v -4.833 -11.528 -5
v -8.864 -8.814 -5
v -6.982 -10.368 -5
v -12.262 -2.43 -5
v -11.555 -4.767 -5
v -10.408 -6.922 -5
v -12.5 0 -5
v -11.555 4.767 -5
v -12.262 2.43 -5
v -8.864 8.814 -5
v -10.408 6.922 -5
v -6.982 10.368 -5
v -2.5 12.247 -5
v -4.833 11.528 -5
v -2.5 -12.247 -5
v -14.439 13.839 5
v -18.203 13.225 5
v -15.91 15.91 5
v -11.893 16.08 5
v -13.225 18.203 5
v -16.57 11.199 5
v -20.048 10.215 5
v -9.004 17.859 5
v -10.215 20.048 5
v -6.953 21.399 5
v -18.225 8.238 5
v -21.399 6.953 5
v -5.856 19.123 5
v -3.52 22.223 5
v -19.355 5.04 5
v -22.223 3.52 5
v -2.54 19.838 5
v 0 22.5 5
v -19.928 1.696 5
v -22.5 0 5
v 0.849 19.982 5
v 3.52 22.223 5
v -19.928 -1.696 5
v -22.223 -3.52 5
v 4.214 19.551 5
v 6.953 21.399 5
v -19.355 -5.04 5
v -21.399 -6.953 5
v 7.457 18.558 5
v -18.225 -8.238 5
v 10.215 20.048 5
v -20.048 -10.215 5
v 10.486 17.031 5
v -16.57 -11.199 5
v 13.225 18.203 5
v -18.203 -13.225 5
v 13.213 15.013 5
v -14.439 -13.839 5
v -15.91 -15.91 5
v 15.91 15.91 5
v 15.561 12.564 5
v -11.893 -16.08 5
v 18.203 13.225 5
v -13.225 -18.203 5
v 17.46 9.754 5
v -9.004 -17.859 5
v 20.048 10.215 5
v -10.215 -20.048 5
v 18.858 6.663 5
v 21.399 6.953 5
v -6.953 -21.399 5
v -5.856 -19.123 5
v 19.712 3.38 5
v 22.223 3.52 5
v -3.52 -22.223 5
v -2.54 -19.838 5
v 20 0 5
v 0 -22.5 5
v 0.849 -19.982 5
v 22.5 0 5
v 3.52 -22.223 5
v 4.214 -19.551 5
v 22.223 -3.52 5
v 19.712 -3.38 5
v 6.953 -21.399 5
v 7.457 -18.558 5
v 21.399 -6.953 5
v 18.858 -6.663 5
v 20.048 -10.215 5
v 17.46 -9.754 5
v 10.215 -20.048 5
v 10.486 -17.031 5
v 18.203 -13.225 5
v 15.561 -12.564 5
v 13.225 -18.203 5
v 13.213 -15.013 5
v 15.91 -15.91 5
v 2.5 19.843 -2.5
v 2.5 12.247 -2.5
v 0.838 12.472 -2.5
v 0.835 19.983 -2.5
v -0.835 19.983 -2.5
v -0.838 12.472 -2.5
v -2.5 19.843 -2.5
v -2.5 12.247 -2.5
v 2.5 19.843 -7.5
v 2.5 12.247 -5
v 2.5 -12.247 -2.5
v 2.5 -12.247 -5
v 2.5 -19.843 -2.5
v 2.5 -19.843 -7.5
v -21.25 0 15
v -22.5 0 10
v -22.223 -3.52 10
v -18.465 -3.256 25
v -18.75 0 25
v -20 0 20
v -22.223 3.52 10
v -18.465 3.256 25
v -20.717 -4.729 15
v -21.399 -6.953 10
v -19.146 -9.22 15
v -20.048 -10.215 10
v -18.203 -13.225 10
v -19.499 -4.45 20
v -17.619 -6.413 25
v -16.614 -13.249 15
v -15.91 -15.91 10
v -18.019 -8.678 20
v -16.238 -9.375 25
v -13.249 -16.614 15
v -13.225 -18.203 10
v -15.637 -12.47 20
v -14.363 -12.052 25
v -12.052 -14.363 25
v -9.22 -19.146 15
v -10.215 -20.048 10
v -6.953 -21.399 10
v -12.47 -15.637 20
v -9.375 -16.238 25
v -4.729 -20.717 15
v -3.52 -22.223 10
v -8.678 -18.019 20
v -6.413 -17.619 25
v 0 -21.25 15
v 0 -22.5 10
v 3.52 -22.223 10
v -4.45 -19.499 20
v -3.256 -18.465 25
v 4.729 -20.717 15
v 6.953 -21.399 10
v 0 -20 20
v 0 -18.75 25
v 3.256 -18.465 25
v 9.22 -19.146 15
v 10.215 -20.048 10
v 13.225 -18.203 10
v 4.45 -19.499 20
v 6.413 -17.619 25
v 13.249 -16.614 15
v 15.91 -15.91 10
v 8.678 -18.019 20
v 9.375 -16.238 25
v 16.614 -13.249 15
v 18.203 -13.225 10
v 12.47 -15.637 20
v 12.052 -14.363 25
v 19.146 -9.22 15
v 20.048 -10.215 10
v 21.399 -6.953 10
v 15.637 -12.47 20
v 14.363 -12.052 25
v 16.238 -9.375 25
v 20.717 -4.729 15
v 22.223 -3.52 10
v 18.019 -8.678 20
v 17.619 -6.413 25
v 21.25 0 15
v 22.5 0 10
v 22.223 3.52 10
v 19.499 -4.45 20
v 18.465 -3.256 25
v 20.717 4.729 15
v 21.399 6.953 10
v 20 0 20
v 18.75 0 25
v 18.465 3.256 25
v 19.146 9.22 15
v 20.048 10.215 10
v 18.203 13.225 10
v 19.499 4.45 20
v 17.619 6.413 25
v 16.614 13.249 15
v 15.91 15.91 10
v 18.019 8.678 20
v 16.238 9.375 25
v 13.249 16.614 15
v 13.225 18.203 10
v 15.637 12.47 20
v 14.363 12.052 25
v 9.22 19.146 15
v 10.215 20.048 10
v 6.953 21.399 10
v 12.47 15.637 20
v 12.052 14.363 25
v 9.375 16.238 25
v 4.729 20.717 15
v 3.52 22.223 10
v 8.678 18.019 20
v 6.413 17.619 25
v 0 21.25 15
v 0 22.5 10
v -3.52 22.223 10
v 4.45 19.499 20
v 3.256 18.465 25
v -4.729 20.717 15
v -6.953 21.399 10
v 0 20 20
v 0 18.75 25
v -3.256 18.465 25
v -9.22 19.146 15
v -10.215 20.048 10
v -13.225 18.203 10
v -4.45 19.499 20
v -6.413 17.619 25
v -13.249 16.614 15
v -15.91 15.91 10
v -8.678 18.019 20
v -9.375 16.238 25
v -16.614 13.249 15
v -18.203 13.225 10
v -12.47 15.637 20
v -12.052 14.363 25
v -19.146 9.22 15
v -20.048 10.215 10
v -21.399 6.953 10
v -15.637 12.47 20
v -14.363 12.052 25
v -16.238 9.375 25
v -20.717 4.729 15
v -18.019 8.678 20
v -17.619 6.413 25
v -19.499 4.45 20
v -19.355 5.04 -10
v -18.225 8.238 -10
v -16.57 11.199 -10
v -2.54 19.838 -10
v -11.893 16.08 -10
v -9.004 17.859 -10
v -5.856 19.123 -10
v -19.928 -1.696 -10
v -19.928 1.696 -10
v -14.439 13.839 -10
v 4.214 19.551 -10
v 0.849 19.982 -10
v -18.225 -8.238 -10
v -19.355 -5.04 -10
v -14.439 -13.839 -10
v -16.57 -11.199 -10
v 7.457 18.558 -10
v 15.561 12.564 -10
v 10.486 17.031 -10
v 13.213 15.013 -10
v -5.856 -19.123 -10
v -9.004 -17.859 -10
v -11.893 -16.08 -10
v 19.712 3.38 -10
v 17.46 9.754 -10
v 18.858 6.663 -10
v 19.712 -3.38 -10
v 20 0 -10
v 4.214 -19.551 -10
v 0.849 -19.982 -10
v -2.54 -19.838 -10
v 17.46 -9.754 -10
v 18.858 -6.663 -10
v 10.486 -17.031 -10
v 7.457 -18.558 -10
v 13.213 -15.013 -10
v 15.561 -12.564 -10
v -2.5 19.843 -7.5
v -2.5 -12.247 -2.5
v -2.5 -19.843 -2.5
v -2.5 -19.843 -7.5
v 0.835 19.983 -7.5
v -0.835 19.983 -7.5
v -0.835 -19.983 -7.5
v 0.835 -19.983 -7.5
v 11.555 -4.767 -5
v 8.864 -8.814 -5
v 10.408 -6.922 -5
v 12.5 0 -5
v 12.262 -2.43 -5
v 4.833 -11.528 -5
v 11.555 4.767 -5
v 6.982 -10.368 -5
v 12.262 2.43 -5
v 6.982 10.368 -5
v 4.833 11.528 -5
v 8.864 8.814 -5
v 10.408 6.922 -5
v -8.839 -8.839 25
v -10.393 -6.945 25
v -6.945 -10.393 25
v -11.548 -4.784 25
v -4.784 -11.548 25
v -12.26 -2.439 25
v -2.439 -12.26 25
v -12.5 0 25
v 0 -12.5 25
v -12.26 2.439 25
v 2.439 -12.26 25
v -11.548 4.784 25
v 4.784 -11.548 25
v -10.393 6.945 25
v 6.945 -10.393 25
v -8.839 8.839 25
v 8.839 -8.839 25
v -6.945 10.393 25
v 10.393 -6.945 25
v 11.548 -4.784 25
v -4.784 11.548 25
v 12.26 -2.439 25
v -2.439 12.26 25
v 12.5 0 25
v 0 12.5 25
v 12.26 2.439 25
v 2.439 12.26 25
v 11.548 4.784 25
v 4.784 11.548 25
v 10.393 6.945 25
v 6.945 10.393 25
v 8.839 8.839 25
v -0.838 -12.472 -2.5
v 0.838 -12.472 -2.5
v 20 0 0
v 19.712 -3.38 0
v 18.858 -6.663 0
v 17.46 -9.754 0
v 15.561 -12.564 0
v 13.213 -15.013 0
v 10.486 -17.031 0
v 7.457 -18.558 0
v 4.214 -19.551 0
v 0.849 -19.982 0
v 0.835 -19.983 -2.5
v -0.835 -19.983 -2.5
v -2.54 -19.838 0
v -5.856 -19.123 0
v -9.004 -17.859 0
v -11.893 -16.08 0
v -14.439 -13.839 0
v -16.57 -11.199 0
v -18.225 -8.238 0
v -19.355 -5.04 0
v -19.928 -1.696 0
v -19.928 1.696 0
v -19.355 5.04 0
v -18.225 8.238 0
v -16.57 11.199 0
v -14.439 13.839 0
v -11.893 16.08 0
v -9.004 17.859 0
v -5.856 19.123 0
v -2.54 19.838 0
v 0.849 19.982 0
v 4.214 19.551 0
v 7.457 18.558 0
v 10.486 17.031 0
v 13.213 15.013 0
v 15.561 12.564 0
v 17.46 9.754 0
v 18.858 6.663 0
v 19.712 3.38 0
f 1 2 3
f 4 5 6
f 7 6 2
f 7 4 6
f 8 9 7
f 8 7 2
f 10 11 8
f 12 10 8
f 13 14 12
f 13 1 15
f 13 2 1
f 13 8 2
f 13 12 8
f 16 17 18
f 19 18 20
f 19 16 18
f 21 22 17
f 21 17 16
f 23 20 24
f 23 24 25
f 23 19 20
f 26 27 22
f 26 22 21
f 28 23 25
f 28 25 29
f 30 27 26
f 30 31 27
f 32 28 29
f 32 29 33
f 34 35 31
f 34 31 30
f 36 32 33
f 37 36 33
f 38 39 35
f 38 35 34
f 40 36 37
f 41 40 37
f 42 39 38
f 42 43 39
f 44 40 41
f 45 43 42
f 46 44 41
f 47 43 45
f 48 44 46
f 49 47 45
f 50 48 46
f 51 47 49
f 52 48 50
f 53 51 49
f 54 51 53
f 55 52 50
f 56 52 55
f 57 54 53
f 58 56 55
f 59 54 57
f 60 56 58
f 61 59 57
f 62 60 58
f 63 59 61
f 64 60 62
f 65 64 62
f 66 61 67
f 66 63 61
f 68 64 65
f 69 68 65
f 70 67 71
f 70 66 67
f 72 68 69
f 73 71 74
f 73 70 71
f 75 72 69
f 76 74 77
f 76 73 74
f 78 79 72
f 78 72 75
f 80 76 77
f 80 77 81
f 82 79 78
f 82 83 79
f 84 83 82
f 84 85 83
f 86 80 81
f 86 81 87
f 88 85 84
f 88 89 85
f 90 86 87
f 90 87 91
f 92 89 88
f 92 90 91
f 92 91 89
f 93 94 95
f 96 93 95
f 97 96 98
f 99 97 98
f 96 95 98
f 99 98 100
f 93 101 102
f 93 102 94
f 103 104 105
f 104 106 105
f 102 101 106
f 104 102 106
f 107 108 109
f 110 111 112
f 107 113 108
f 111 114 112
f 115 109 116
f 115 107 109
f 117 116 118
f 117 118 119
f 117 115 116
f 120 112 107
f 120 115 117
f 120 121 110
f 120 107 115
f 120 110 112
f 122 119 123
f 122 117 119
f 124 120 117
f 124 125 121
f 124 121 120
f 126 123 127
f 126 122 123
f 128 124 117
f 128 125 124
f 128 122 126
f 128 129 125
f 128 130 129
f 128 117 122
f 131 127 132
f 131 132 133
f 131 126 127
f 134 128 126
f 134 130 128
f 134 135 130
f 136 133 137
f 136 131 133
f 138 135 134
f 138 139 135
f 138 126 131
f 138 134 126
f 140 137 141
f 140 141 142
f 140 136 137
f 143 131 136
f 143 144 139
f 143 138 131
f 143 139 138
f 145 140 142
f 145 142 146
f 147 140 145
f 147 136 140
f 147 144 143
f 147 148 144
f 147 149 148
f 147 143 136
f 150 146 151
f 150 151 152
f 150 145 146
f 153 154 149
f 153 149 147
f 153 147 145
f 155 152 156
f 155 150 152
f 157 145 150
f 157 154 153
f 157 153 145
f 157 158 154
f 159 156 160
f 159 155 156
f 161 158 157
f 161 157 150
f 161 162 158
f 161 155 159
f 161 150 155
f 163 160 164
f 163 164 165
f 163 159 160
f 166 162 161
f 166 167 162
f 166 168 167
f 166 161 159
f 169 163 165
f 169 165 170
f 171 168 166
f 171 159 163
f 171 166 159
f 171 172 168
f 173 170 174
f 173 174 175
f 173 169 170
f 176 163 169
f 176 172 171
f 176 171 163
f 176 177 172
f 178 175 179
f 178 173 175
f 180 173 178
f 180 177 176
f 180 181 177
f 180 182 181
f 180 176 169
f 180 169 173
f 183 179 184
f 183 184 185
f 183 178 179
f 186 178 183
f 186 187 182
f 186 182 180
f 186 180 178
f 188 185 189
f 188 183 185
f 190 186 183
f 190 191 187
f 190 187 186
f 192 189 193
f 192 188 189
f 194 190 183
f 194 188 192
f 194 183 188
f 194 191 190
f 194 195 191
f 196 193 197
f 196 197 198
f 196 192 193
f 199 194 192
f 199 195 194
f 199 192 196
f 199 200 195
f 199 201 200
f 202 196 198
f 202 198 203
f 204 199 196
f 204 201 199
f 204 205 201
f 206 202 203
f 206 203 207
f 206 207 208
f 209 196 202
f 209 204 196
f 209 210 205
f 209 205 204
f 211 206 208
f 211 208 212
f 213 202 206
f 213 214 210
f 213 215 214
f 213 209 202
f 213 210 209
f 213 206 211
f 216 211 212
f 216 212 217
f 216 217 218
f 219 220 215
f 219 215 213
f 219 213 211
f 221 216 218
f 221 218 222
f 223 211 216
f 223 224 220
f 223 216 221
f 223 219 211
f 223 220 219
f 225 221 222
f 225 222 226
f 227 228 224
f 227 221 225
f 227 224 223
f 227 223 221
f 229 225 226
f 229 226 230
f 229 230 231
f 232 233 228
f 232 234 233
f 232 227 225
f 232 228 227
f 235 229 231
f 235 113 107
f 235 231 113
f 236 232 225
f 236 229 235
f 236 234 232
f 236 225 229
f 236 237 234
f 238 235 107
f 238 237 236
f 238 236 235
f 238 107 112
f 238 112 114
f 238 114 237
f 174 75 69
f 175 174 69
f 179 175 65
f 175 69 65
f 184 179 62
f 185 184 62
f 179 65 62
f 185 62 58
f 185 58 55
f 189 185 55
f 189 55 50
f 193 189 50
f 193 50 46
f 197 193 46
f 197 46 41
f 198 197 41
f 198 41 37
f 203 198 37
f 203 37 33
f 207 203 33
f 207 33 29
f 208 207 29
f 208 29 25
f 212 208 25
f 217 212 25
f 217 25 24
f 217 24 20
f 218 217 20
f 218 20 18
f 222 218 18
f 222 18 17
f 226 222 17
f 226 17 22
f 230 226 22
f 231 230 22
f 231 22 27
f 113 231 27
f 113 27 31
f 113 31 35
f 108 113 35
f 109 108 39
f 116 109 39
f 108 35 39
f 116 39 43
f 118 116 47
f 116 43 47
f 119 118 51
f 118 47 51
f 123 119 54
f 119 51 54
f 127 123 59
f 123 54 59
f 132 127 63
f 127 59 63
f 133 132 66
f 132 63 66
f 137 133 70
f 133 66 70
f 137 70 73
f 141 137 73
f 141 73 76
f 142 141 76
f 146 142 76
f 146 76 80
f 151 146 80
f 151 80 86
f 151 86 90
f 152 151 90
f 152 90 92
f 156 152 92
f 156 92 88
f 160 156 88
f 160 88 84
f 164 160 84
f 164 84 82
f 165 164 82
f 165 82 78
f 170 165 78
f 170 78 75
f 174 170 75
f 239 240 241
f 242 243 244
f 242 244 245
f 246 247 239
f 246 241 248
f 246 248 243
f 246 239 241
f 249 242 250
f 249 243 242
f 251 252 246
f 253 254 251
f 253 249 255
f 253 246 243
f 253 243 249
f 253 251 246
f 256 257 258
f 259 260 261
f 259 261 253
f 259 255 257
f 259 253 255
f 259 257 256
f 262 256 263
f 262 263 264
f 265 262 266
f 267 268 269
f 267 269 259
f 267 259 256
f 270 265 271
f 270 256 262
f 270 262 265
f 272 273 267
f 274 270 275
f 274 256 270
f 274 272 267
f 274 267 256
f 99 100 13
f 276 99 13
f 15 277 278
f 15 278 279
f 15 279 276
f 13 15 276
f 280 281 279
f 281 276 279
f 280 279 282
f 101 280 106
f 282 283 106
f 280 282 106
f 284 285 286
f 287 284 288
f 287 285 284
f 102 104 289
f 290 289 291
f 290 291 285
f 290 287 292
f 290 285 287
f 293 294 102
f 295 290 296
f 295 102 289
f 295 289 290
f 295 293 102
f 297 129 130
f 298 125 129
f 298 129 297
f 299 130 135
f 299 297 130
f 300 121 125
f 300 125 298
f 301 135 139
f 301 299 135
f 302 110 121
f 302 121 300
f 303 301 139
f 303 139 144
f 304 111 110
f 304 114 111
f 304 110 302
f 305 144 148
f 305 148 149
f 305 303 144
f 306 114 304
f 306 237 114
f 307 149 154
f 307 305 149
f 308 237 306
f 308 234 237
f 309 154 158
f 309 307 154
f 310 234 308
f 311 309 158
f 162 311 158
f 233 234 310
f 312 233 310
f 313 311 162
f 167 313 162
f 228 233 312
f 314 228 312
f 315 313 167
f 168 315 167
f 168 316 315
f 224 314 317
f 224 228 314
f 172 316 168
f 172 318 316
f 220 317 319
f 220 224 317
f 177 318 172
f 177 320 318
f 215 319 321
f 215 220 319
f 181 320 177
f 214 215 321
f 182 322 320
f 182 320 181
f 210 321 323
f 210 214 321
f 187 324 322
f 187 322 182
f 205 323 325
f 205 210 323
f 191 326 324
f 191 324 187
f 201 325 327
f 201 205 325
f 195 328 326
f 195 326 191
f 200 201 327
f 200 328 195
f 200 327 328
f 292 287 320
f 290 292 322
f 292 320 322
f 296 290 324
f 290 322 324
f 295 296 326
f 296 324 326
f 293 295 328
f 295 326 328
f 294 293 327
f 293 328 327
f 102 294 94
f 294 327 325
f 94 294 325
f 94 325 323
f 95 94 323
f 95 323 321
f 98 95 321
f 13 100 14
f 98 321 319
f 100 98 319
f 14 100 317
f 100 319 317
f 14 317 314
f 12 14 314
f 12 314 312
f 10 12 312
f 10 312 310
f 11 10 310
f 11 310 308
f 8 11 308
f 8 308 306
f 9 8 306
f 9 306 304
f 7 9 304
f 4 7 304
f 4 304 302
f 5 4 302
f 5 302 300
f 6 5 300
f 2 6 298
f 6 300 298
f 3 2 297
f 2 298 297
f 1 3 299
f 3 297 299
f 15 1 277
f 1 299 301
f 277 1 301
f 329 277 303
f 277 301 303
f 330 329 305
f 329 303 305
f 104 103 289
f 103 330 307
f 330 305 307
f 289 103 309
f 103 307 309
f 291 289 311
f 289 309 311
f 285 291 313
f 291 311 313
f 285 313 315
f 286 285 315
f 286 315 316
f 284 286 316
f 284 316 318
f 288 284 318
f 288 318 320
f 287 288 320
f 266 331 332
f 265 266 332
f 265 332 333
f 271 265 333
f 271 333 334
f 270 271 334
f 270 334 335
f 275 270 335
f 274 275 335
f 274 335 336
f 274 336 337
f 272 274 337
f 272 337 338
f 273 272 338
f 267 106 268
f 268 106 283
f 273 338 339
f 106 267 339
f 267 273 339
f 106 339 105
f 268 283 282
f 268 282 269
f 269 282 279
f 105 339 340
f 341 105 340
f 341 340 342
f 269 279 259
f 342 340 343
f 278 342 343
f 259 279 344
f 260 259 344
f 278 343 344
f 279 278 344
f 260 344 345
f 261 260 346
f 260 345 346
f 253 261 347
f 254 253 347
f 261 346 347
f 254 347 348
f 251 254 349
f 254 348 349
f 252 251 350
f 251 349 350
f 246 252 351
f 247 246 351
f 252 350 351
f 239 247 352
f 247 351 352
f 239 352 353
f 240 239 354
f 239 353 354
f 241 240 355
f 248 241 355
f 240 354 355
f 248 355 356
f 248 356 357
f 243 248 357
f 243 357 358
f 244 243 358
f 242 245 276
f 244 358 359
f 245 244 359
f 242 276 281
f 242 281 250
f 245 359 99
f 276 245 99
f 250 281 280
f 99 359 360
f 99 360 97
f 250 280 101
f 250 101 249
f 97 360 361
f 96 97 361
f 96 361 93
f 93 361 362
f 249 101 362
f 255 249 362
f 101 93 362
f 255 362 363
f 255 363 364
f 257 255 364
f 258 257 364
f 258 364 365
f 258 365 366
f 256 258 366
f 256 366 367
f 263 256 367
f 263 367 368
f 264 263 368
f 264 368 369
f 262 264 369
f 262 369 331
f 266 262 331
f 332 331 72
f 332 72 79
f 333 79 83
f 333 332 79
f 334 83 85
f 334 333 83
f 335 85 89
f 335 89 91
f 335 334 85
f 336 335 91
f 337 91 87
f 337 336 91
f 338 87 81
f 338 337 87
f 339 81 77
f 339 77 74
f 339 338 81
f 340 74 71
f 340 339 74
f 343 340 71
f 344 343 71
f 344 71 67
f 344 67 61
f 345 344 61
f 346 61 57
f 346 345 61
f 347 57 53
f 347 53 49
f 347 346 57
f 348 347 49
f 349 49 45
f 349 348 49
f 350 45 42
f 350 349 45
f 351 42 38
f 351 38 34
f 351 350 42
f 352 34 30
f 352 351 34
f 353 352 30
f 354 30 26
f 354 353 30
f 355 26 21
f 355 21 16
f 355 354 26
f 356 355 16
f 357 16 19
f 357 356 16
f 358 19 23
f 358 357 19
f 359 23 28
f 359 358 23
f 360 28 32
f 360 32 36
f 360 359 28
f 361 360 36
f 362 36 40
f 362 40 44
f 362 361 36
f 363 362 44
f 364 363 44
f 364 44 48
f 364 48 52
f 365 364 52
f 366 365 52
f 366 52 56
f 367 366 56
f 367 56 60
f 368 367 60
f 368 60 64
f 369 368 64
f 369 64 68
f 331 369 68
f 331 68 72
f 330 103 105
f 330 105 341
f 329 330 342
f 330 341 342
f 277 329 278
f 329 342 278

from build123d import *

# Parameters (mm, degrees)
F0_R      = 22.5
F1_DEPTH  = 25
F2_R      = 22.5
F2_R_2    = 20
F3_DEPTH  = 5
F1_FACE_R = 20
F7_DEPTH  = 10
F6_R      = 12.5
F8_DEPTH  = 30
F10_DEPTH = 25


with BuildPart() as f1:
    # F0 (on Top) → F1 (new body)
    with BuildSketch(Plane.XY):
        Circle(F0_R)
    extrude(amount=F1_DEPTH)

    # F2 (on face) → F3 (cut)
    with BuildSketch(Plane(origin=(0, 0, 0), x_dir=(1, 0, 0), z_dir=(0, 0, -1))):
        Circle(F2_R)
        Circle(F2_R_2, mode=Mode.SUBTRACT)
    extrude(amount=-F3_DEPTH, mode=Mode.SUBTRACT)

    # F4 (on Front) → F5 (revolve, cut)
    with BuildSketch(Plane.XZ):
        Polygon((-22.5, 30), (-22.5, 10), (-17.5, 30), align=None)
    revolve(axis=Axis((0, 0, 15), (0, 0, 1)), mode=Mode.SUBTRACT)

    # F1_face (on face) → F7 (join)
    with BuildSketch(Plane(origin=(0, 0, 0), x_dir=(1, 0, 0), z_dir=(0, 0, -1))):
        Circle(F1_FACE_R)
    extrude(amount=F7_DEPTH)

    # F6 (on face) → F8 (cut)
    with BuildSketch(Plane.XY.offset(25)):
        Circle(F6_R)
    extrude(amount=-F8_DEPTH, mode=Mode.SUBTRACT)

    # F9 (on Front) → F10 (cut, symmetric)
    with BuildSketch(Plane.XZ):
        Polygon((2.5, -2.5), (0, -2.5), (0, -5), (0, -7.5), (2.5, -7.5), align=None)
        Polygon((0, -5), (0, -2.5), (-2.5, -2.5), (-2.5, -7.5), (0, -7.5), align=None)
    extrude(amount=F10_DEPTH, both=True, mode=Mode.SUBTRACT)


solid = f1.part
